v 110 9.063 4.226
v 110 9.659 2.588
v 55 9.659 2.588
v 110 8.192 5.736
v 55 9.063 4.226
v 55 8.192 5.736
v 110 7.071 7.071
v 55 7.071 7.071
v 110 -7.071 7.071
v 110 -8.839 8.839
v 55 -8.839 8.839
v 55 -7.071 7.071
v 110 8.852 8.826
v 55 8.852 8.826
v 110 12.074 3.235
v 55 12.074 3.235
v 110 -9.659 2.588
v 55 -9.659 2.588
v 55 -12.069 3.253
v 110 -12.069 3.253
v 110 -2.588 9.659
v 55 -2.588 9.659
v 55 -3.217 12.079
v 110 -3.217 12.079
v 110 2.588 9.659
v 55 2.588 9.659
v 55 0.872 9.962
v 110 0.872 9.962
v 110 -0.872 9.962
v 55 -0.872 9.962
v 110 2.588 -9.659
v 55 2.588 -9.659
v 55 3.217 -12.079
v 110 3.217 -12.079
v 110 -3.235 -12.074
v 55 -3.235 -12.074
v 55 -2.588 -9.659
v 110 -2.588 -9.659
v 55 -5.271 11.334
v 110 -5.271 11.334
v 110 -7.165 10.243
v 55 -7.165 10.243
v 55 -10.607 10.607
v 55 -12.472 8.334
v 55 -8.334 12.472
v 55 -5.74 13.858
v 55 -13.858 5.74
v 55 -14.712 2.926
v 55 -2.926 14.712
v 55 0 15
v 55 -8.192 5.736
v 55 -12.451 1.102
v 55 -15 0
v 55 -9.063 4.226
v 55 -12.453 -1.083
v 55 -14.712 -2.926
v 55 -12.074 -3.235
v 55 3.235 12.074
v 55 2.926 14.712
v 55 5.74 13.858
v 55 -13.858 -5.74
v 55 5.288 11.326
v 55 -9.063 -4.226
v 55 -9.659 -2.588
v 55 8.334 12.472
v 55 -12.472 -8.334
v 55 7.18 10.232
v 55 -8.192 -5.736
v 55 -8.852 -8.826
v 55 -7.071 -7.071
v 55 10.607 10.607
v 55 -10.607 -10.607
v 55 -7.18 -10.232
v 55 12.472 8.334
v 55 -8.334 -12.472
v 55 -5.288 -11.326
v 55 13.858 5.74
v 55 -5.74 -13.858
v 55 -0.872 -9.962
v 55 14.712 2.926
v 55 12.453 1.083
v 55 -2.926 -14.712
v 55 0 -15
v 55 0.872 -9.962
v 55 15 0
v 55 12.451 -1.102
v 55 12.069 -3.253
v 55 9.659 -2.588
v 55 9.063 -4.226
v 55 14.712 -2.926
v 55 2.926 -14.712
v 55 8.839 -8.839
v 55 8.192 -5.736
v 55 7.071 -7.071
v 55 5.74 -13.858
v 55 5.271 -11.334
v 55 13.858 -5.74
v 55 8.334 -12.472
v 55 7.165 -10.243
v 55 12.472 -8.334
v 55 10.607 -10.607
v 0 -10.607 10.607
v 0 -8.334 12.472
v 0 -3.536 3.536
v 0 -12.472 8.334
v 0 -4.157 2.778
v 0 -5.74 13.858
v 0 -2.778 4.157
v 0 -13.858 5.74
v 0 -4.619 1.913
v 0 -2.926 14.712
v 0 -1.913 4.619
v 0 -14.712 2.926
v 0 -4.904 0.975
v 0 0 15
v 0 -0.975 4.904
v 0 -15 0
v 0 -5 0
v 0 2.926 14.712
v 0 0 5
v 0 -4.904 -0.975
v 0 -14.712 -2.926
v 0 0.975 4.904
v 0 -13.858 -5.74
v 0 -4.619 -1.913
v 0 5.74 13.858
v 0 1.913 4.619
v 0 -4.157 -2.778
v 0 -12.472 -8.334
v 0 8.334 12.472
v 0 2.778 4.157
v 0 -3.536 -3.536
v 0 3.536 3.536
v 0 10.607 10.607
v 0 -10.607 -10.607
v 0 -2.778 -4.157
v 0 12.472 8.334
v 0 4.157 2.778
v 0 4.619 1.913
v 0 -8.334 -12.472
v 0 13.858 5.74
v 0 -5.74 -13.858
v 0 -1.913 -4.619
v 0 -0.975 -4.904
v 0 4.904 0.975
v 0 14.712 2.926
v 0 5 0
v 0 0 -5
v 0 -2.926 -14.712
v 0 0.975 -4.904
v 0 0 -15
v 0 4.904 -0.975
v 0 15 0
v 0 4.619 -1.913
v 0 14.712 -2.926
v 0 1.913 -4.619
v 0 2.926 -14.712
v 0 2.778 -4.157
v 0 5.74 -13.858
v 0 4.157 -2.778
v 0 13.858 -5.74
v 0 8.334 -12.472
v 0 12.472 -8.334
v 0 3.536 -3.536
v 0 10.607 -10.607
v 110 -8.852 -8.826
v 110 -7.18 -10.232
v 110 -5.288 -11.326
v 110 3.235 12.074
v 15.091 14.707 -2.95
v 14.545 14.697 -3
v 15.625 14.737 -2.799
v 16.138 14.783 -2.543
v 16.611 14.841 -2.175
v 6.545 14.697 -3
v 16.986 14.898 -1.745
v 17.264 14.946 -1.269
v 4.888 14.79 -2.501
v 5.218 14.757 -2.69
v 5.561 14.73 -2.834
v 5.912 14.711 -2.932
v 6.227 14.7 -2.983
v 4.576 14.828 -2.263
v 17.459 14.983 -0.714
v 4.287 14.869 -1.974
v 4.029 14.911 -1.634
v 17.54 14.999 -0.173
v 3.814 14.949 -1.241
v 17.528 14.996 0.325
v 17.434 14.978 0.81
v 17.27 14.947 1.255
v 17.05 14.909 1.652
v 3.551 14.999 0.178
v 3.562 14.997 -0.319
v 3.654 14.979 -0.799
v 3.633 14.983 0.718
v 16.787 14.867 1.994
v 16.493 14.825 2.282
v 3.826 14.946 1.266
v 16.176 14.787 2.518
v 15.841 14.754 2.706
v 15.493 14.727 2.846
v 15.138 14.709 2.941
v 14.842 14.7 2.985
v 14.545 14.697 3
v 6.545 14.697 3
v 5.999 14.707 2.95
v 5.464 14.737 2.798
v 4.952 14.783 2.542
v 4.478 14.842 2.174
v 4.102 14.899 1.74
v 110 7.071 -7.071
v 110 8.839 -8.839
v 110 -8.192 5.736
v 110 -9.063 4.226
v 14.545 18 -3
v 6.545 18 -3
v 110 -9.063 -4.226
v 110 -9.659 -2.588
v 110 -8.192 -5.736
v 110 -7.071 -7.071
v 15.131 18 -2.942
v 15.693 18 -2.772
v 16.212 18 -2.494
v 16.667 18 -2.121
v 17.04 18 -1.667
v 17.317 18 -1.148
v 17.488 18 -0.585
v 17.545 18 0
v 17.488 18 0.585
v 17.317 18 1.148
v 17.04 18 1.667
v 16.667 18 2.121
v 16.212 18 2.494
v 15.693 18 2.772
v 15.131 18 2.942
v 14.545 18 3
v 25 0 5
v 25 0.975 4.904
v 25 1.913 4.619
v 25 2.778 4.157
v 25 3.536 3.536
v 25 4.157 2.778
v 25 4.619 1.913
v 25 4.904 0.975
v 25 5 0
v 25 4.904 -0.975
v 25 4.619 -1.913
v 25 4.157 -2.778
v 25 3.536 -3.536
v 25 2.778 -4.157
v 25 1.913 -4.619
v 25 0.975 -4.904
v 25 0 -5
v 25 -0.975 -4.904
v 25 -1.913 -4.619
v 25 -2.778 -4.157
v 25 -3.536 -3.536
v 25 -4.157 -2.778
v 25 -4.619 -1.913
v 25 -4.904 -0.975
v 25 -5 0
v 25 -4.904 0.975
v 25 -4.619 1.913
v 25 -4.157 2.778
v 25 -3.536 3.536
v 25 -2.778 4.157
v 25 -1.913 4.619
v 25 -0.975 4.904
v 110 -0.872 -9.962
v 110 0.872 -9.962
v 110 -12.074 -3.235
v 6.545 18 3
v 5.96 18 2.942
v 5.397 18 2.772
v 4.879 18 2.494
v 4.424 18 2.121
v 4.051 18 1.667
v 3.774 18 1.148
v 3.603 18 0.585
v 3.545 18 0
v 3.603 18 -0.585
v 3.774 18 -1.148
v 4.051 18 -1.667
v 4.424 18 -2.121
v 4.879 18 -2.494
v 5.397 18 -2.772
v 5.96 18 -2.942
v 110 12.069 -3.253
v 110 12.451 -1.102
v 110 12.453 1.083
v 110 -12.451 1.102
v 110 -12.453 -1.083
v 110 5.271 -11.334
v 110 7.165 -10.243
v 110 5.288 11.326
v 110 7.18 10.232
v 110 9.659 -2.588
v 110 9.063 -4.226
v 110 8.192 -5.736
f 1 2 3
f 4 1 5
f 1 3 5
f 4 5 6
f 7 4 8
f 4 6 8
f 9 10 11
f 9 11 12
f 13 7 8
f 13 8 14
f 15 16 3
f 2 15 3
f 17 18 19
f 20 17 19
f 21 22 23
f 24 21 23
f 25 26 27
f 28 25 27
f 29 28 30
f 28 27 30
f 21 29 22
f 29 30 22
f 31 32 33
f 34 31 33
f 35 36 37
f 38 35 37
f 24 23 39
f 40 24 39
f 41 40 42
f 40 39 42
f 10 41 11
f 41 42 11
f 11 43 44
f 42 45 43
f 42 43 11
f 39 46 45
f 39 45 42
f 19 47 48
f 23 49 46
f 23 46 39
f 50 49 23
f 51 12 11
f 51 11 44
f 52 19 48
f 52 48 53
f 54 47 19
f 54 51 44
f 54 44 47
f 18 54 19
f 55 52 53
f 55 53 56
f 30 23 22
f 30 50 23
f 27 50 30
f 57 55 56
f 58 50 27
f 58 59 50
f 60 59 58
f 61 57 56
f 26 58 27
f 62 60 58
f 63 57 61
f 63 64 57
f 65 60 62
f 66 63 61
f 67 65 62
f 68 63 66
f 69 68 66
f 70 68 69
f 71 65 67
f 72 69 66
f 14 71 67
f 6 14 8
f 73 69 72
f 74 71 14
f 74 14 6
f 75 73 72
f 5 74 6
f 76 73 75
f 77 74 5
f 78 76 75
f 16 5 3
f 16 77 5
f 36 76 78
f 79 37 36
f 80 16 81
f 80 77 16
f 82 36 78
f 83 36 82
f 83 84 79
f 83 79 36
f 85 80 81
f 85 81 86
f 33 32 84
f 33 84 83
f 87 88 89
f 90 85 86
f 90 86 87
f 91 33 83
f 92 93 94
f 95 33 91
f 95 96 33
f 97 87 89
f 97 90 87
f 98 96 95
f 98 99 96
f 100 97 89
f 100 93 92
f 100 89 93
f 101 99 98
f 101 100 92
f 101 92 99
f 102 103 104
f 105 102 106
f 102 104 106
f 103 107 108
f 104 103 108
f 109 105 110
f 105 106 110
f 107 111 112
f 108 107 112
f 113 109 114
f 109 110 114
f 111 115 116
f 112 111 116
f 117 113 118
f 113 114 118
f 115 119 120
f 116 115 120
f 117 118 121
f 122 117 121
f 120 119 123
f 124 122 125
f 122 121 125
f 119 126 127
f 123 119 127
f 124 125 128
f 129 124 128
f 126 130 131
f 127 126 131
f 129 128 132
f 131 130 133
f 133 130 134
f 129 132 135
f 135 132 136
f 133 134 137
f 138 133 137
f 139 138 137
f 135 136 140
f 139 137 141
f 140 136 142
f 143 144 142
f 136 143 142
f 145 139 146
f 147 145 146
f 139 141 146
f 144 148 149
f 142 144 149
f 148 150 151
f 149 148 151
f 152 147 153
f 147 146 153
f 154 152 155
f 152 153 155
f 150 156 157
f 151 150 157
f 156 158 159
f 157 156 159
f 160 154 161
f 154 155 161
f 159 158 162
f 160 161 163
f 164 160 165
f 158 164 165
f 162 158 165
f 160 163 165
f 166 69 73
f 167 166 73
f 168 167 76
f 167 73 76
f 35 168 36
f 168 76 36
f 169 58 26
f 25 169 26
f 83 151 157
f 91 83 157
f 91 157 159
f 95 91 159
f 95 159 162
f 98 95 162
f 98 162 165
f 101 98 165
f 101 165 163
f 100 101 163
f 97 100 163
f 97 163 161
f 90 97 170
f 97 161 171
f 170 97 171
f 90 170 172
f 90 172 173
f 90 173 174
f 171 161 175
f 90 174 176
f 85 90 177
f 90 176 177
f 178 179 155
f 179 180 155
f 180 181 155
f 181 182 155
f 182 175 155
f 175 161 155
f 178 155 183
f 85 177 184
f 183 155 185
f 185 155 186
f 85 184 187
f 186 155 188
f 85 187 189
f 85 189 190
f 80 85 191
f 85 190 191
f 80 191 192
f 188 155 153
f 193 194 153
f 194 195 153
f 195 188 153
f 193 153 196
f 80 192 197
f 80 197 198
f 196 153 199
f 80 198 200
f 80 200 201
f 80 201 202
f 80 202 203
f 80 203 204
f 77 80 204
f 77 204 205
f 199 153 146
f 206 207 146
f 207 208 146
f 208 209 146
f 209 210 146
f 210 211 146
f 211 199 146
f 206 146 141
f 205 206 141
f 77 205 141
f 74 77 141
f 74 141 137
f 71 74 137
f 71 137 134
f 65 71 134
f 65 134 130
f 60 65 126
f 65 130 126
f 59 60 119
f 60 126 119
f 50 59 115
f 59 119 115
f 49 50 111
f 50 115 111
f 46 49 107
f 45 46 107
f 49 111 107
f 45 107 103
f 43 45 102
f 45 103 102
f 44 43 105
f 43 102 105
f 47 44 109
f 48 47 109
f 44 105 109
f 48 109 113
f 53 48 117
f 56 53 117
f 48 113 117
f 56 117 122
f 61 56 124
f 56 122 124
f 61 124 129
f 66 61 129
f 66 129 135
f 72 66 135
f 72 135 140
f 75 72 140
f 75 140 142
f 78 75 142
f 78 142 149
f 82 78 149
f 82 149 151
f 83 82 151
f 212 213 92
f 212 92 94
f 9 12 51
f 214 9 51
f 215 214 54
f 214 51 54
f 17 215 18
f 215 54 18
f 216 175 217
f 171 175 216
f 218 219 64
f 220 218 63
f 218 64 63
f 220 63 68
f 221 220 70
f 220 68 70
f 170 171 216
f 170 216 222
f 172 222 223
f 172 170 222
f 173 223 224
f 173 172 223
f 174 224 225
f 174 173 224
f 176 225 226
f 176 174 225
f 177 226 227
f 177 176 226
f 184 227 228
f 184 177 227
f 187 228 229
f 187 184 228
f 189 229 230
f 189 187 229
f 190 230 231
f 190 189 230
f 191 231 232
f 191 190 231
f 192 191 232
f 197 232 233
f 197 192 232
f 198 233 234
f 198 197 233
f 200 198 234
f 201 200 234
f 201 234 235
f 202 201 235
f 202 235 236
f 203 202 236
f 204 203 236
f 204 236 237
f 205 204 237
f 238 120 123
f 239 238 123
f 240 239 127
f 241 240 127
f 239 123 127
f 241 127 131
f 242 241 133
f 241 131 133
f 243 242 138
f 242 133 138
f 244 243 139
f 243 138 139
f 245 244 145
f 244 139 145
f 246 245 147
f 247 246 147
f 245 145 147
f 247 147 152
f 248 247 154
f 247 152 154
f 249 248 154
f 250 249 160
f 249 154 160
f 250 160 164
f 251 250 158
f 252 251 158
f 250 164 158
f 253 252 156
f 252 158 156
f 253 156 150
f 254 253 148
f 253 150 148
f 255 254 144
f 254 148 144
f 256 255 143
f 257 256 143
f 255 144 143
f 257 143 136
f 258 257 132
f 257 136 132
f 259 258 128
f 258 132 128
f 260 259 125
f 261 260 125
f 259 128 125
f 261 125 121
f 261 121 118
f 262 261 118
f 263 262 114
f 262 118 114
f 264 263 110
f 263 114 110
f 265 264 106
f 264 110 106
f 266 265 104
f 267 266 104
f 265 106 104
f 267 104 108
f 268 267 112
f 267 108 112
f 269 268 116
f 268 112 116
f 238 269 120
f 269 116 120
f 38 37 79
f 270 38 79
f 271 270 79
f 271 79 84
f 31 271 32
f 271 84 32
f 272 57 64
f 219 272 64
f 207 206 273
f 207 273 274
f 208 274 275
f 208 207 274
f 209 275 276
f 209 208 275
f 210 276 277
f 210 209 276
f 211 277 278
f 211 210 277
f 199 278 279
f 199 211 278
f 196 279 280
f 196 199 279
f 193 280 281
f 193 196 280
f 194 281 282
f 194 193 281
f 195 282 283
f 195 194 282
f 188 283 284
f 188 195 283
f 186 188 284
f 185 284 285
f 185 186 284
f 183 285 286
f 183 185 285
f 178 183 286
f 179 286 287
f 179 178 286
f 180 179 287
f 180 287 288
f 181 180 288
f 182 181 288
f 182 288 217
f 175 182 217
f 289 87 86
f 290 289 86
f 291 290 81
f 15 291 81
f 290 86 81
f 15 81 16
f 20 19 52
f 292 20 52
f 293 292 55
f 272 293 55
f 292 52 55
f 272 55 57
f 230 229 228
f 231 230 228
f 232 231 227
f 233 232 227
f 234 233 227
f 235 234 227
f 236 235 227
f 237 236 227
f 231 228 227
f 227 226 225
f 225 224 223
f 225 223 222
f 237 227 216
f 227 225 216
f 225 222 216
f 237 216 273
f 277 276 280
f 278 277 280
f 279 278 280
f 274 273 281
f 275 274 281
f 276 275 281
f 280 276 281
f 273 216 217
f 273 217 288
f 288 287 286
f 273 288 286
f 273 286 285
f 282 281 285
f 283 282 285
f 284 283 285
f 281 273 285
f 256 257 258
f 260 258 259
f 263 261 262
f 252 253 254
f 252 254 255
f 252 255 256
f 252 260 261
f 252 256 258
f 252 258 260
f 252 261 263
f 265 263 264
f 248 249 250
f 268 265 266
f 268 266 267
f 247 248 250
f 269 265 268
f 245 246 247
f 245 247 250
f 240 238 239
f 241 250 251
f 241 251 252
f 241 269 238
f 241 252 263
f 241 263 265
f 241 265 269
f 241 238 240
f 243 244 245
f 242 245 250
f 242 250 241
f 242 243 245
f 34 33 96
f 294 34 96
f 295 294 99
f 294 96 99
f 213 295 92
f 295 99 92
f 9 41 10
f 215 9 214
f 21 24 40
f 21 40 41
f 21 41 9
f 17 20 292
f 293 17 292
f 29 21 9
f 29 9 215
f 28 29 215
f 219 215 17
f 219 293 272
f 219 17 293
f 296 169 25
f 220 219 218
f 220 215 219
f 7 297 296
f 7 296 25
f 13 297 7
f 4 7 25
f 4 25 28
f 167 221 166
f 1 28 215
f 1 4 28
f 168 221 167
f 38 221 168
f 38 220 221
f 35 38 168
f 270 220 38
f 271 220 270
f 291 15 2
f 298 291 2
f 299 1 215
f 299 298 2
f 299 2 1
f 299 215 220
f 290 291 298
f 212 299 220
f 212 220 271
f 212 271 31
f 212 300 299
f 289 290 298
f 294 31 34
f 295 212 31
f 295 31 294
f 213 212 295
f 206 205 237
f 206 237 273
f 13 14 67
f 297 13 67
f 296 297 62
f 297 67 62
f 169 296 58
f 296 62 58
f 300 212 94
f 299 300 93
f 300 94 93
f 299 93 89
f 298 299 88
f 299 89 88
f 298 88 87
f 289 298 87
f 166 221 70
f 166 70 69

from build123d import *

# Parameters (mm, degrees)
SKETCH_1_R          = 15
EXTRUDE_1_DEPTH     = 55
SKETCH_2_R          = 10
EXTRUDE_2_DEPTH     = 55
SKETCH_3_R          = 5
CUT_EXTRUDE_1_DEPTH = 25
EXTRUDE_START       = 10
EXTRUDE_3_DEPTH     = 8


with BuildPart() as part:
    # 草图1 → 凸台-拉伸1 (new body)
    with BuildSketch(Plane(origin=(0, 0, 0), x_dir=(0, 0, -1), z_dir=(1, 0, 0))):
        Circle(SKETCH_1_R)
    extrude(amount=EXTRUDE_1_DEPTH)

    # 草图2 → 凸台-拉伸2 (add)
    with BuildSketch(Plane(origin=(55, 0, 0), x_dir=(0, 0, -1), z_dir=(1, 0, 0))):
        with BuildLine():
            ThreePointArc((-9.659258263, 2.588190451), (-8.660254038, 5), (-7.071067812, 7.071067812))
            Line((-7.071067812, 7.071067812), (-8.825622579, 8.852027231))
            ThreePointArc((-8.825622579, 8.852027231), (-10.8206468, 6.258083), (-12.074072829, 3.235238064))
            Line((-12.074072829, 3.235238064), (-9.659258263, 2.588190451))
        make_face()
        Circle(SKETCH_2_R)
        with BuildLine():
            ThreePointArc((3.253269167, 12.069226973), (0.009335457, 12.499996514), (-3.235238064, 12.074072829))
            Line((-3.235238064, 12.074072829), (-2.588190451, 9.659258263))
            ThreePointArc((-2.588190451, 9.659258263), (0, 10), (2.588190451, 9.659258263))
            Line((2.588190451, 9.659258263), (3.253269167, 12.069226973))
        make_face()
        with BuildLine():
            Line((8.838834765, 8.838834765), (7.071067812, 7.071067812))
            ThreePointArc((7.071067812, 7.071067812), (8.660254038, 5), (9.659258263, 2.588190451))
            Line((9.659258263, 2.588190451), (12.078891746, 3.217199742))
            ThreePointArc((12.078891746, 3.217199742), (10.829982257, 6.241913514), (8.838834765, 8.838834765))
        make_face()
        with BuildLine():
            Line((12.074072829, -3.235238064), (9.659258263, -2.588190451))
            ThreePointArc((9.659258263, -2.588190451), (8.660254038, -5), (7.071067812, -7.071067812))
            Line((7.071067812, -7.071067812), (8.825622579, -8.852027231))
            ThreePointArc((8.825622579, -8.852027231), (10.8206468, -6.258083), (12.074072829, -3.235238064))
        make_face()
        with BuildLine():
            ThreePointArc((2.588190451, -9.659258263), (0, -10), (-2.588190451, -9.659258263))
            Line((-2.588190451, -9.659258263), (-3.253269167, -12.069226973))
            ThreePointArc((-3.253269167, -12.069226973), (-0.009335457, -12.499996514), (3.235238064, -12.074072829))
            Line((3.235238064, -12.074072829), (2.588190451, -9.659258263))
        make_face()
        with BuildLine():
            ThreePointArc((-7.071067812, -7.071067812), (-8.660254038, -5), (-9.659258263, -2.588190451))
            Line((-9.659258263, -2.588190451), (-12.078891746, -3.217199742))
            ThreePointArc((-12.078891746, -3.217199742), (-10.829982257, -6.241913514), (-8.838834765, -8.838834765))
            Line((-8.838834765, -8.838834765), (-7.071067812, -7.071067812))
        make_face()
    extrude(amount=EXTRUDE_2_DEPTH)

    # 草图3 → 切除-拉伸1 (cut)
    with BuildSketch(Plane.ZY):
        Circle(SKETCH_3_R)
    extrude(amount=-CUT_EXTRUDE_1_DEPTH, mode=Mode.SUBTRACT)

    # 草图4 → 凸台-拉伸3 (add)
    with BuildSketch(Plane(origin=(0, 0, 0), x_dir=(1, 0, 0), z_dir=(0, 1, 0)).offset(EXTRUDE_START)):
        with BuildLine():
            Line((6.545306006, 3), (14.545306006, 3))
            ThreePointArc((14.545306006, 3), (17.545306006, 0), (14.545306006, -3))
            Line((14.545306006, -3), (6.545306006, -3))
            ThreePointArc((6.545306006, -3), (3.545306006, 0), (6.545306006, 3))
        make_face()
    extrude(amount=EXTRUDE_3_DEPTH)


solid = part.part
